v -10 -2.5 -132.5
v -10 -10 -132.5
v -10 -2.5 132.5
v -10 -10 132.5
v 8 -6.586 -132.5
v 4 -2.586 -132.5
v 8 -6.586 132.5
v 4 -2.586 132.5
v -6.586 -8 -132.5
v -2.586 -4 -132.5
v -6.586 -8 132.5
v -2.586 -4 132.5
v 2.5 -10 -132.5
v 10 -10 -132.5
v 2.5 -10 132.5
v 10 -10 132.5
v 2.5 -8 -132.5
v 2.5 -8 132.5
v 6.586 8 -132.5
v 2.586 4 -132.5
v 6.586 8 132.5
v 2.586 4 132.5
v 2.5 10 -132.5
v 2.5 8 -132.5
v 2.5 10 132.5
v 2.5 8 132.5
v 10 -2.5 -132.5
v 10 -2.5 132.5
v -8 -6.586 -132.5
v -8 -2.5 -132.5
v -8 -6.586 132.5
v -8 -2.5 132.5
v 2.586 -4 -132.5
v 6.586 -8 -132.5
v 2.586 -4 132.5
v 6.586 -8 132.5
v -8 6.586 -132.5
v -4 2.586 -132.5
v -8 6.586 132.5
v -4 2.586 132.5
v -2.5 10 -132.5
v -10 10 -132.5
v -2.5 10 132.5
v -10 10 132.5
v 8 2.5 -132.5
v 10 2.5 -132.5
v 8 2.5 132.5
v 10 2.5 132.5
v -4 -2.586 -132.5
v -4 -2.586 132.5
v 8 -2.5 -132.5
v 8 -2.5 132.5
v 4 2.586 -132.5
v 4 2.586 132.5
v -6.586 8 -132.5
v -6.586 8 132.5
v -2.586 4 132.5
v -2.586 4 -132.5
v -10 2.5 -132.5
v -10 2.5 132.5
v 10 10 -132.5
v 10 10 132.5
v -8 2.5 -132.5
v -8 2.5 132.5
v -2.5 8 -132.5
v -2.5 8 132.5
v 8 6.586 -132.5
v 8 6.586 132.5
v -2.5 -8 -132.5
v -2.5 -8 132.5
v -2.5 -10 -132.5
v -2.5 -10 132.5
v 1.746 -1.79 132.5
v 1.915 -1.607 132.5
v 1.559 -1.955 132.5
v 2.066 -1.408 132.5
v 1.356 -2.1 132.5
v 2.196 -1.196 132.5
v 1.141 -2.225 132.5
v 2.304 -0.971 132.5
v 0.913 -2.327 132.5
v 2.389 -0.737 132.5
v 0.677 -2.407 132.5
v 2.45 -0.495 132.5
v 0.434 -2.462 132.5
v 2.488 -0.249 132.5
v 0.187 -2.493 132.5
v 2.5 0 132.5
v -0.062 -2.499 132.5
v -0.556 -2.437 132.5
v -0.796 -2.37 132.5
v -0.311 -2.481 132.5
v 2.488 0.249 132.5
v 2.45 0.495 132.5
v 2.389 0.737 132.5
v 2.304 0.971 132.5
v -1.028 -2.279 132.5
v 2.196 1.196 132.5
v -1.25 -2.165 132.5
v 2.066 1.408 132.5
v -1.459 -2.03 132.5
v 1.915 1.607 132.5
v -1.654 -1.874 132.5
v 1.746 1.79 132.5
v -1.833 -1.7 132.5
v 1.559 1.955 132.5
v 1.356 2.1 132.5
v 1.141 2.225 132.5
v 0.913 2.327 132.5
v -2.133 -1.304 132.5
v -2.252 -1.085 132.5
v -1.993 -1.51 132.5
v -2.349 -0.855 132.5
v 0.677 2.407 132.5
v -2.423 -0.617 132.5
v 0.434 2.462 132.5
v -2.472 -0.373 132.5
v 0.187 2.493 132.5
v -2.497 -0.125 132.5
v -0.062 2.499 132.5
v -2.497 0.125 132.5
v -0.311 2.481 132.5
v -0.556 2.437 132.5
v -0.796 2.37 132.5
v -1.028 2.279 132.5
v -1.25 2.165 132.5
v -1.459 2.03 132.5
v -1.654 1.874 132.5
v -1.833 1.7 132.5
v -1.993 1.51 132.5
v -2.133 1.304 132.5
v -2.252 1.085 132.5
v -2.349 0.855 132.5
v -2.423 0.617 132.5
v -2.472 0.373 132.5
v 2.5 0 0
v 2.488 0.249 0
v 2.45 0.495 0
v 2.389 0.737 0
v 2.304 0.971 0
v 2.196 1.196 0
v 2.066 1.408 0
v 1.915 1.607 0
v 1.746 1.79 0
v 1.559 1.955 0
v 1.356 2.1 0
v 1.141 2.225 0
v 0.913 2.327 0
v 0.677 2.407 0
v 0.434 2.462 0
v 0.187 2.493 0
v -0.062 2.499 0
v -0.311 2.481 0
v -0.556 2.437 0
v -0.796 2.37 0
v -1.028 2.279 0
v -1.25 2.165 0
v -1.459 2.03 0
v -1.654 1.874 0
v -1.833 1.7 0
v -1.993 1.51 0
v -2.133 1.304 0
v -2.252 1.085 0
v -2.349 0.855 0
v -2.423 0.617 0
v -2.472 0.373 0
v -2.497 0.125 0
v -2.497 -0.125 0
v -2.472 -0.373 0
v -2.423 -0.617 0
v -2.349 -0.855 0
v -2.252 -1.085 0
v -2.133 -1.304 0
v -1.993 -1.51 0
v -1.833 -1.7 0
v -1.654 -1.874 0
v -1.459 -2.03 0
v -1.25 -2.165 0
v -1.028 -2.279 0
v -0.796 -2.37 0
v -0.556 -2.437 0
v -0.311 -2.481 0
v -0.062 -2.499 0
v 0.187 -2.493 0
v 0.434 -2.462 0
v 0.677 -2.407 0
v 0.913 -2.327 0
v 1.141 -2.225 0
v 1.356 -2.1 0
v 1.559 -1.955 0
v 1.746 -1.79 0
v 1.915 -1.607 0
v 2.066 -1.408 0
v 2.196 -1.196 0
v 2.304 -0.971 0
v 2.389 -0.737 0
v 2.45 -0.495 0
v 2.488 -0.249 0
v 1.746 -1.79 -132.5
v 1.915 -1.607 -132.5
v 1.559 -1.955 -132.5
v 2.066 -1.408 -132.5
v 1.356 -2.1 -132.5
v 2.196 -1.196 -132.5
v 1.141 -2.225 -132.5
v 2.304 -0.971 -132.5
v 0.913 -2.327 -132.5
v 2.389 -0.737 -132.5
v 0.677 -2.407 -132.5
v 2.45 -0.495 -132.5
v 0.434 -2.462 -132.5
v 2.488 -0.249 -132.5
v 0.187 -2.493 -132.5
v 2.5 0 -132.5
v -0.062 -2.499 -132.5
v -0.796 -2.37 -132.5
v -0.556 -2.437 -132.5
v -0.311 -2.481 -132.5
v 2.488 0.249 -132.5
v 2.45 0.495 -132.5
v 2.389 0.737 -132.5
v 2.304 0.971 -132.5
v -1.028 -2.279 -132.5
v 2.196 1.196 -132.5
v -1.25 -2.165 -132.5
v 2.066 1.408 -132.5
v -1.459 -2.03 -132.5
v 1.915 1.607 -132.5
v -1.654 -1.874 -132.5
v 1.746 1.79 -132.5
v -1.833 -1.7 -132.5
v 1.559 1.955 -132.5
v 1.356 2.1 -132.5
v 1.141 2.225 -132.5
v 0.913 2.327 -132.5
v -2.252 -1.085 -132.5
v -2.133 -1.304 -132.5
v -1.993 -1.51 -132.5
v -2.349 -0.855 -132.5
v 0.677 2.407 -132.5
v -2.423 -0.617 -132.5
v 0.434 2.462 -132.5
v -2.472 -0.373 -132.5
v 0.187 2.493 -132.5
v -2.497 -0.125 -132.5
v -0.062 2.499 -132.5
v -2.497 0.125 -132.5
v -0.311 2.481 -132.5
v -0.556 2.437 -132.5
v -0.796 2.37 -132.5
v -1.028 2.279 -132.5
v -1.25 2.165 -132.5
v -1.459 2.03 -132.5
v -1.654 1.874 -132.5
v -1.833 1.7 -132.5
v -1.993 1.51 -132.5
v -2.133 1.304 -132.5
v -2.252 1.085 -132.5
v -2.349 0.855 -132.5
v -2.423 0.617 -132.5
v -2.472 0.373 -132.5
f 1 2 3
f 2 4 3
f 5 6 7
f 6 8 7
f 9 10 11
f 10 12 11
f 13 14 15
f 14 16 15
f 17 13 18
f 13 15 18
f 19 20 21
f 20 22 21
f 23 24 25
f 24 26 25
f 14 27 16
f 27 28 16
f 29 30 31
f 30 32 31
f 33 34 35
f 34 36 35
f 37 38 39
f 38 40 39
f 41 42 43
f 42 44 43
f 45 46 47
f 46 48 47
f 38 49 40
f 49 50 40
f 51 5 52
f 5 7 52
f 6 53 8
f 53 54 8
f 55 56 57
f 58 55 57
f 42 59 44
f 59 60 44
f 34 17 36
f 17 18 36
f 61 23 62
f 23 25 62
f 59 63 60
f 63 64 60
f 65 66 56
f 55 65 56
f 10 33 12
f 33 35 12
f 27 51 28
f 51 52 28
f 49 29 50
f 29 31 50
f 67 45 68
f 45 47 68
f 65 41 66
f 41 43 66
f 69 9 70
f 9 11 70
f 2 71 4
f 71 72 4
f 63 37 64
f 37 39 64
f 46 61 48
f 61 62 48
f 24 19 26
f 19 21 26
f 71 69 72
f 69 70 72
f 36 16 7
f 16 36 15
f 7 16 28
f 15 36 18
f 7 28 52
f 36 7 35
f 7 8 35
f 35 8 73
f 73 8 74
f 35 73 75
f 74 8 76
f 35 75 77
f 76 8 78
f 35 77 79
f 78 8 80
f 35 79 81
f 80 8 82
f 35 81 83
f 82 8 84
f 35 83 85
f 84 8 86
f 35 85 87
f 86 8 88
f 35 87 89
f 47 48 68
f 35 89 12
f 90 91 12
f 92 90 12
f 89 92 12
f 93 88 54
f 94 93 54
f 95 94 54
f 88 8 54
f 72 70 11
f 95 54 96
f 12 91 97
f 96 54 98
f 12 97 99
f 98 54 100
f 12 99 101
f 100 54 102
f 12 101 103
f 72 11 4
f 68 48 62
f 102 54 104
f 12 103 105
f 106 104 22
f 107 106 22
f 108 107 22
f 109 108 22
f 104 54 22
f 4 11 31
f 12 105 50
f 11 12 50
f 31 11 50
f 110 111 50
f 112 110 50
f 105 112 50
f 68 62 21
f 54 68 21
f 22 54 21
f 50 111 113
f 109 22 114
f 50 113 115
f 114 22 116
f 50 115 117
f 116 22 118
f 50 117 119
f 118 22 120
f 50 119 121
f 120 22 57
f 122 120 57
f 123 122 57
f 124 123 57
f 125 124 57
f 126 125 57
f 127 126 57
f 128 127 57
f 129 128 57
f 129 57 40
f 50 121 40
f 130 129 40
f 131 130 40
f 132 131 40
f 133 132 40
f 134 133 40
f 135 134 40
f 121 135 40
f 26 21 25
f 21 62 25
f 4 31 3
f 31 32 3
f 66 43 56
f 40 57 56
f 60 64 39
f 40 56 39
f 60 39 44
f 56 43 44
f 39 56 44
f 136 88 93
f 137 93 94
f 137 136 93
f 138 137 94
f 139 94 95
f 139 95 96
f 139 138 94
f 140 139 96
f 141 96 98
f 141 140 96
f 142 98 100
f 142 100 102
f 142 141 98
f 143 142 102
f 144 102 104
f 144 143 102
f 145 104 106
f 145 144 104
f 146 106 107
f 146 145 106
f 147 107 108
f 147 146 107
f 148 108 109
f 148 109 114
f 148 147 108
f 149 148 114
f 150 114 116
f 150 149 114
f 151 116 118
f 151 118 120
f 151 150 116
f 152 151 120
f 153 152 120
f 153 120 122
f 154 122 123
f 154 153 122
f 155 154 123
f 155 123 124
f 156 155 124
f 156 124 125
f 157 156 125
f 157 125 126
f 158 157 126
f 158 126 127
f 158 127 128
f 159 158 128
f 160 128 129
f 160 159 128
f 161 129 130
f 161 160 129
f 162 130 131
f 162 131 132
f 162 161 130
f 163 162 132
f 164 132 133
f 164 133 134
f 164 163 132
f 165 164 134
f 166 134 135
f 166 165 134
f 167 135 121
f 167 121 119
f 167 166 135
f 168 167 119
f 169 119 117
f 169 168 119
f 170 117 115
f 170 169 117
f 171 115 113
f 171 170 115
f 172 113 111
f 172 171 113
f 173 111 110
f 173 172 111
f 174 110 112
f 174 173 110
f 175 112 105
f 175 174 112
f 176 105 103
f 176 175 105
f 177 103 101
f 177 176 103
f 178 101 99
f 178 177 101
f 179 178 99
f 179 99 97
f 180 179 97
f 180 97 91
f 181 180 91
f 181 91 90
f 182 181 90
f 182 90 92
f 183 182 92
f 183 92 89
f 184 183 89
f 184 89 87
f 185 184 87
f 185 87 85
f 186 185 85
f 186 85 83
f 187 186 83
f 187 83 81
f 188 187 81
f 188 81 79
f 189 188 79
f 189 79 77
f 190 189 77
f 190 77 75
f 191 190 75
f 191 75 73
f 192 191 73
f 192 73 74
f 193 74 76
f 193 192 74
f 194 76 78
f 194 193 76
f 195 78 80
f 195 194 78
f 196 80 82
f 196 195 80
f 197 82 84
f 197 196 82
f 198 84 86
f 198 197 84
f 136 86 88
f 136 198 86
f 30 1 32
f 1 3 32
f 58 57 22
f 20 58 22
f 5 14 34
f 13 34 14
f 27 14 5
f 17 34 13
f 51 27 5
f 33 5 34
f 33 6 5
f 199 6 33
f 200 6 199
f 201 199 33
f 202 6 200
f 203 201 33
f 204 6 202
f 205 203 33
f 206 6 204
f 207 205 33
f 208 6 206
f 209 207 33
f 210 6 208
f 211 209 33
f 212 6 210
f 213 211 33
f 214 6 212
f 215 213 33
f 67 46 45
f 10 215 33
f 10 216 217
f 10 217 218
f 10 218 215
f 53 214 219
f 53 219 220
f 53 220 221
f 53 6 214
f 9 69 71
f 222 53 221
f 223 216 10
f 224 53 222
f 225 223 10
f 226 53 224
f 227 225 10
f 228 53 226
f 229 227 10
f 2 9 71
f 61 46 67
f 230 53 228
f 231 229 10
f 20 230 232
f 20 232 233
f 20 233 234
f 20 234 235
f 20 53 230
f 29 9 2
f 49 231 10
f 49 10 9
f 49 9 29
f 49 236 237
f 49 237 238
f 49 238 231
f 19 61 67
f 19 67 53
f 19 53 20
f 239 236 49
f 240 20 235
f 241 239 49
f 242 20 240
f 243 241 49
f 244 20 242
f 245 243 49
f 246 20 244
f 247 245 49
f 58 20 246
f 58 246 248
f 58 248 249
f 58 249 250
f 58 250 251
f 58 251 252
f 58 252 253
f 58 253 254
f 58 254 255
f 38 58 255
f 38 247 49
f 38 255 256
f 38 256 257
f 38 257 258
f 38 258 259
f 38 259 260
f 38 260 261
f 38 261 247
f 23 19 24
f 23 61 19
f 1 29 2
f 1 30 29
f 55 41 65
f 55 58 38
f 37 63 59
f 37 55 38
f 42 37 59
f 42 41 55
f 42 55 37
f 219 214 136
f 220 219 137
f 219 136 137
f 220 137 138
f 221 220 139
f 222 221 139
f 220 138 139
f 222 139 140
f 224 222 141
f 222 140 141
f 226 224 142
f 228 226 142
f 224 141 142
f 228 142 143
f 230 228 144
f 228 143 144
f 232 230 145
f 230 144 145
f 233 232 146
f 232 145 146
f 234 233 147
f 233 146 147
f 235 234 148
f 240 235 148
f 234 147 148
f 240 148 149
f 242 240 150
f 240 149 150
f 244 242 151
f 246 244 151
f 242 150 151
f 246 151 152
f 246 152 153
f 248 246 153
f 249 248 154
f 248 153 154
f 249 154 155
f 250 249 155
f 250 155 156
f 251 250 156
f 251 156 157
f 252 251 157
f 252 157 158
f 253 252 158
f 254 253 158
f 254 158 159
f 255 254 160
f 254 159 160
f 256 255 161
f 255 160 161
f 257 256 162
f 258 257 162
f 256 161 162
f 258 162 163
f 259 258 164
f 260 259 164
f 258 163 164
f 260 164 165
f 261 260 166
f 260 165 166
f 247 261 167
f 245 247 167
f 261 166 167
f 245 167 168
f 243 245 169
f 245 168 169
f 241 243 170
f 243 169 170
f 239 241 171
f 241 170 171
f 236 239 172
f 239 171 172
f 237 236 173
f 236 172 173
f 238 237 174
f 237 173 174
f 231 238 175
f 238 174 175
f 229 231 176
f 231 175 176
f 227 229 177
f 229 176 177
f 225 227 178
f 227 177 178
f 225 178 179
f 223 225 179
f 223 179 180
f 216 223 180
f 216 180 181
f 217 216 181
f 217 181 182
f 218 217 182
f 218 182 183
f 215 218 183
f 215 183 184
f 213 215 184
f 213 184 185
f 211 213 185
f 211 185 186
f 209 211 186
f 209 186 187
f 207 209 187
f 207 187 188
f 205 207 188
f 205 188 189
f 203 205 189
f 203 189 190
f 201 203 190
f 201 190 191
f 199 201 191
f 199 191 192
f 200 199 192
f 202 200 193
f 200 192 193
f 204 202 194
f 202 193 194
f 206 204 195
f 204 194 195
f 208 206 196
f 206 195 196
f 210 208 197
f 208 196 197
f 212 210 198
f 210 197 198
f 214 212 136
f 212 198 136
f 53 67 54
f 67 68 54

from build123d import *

# Parameters (mm, degrees)
BOSS_EXTRUDE1_DEPTH     = 132.5
CUT_EXTRUDE3_DEPTH      = 132.5
CUT_EXTRUDE3_DEPTH_BACK = 132.5
SKETCH2_R               = 2.5


with BuildPart() as part:
    # Sketch1 → Boss-Extrude1 (new, symmetric)
    with BuildSketch(Plane.XY):
        Polygon((-2.585786438, 4), (2.585786438, 4), (6.585786438, 8), (2.5, 8), (2.5, 10), (10, 10), (10, 2.5), (8, 2.5), (8, 6.585786438), (4, 2.585786438), (4, -2.585786438), (8, -6.585786438), (8, -2.5), (10, -2.5), (10, -10), (2.5, -10), (2.5, -8), (6.585786438, -8), (2.585786438, -4), (-2.585786438, -4), (-6.585786438, -8), (-2.5, -8), (-2.5, -10), (-10, -10), (-10, -2.5), (-8, -2.5), (-8, -6.585786438), (-4, -2.585786438), (-4, 2.585786438), (-8, 6.585786438), (-8, 2.5), (-10, 2.5), (-10, 10), (-2.5, 10), (-2.5, 8), (-6.585786438, 8), align=None)
    extrude(amount=BOSS_EXTRUDE1_DEPTH, both=True)

    # Sketch2 → Cut-Extrude3 (cut, two sides: drawn at the far end of the back side and taken through both)
    with BuildSketch(Plane.XY.offset(-CUT_EXTRUDE3_DEPTH_BACK)):
        Circle(SKETCH2_R)
    extrude(amount=CUT_EXTRUDE3_DEPTH + CUT_EXTRUDE3_DEPTH_BACK, mode=Mode.SUBTRACT)


solid = part.part
